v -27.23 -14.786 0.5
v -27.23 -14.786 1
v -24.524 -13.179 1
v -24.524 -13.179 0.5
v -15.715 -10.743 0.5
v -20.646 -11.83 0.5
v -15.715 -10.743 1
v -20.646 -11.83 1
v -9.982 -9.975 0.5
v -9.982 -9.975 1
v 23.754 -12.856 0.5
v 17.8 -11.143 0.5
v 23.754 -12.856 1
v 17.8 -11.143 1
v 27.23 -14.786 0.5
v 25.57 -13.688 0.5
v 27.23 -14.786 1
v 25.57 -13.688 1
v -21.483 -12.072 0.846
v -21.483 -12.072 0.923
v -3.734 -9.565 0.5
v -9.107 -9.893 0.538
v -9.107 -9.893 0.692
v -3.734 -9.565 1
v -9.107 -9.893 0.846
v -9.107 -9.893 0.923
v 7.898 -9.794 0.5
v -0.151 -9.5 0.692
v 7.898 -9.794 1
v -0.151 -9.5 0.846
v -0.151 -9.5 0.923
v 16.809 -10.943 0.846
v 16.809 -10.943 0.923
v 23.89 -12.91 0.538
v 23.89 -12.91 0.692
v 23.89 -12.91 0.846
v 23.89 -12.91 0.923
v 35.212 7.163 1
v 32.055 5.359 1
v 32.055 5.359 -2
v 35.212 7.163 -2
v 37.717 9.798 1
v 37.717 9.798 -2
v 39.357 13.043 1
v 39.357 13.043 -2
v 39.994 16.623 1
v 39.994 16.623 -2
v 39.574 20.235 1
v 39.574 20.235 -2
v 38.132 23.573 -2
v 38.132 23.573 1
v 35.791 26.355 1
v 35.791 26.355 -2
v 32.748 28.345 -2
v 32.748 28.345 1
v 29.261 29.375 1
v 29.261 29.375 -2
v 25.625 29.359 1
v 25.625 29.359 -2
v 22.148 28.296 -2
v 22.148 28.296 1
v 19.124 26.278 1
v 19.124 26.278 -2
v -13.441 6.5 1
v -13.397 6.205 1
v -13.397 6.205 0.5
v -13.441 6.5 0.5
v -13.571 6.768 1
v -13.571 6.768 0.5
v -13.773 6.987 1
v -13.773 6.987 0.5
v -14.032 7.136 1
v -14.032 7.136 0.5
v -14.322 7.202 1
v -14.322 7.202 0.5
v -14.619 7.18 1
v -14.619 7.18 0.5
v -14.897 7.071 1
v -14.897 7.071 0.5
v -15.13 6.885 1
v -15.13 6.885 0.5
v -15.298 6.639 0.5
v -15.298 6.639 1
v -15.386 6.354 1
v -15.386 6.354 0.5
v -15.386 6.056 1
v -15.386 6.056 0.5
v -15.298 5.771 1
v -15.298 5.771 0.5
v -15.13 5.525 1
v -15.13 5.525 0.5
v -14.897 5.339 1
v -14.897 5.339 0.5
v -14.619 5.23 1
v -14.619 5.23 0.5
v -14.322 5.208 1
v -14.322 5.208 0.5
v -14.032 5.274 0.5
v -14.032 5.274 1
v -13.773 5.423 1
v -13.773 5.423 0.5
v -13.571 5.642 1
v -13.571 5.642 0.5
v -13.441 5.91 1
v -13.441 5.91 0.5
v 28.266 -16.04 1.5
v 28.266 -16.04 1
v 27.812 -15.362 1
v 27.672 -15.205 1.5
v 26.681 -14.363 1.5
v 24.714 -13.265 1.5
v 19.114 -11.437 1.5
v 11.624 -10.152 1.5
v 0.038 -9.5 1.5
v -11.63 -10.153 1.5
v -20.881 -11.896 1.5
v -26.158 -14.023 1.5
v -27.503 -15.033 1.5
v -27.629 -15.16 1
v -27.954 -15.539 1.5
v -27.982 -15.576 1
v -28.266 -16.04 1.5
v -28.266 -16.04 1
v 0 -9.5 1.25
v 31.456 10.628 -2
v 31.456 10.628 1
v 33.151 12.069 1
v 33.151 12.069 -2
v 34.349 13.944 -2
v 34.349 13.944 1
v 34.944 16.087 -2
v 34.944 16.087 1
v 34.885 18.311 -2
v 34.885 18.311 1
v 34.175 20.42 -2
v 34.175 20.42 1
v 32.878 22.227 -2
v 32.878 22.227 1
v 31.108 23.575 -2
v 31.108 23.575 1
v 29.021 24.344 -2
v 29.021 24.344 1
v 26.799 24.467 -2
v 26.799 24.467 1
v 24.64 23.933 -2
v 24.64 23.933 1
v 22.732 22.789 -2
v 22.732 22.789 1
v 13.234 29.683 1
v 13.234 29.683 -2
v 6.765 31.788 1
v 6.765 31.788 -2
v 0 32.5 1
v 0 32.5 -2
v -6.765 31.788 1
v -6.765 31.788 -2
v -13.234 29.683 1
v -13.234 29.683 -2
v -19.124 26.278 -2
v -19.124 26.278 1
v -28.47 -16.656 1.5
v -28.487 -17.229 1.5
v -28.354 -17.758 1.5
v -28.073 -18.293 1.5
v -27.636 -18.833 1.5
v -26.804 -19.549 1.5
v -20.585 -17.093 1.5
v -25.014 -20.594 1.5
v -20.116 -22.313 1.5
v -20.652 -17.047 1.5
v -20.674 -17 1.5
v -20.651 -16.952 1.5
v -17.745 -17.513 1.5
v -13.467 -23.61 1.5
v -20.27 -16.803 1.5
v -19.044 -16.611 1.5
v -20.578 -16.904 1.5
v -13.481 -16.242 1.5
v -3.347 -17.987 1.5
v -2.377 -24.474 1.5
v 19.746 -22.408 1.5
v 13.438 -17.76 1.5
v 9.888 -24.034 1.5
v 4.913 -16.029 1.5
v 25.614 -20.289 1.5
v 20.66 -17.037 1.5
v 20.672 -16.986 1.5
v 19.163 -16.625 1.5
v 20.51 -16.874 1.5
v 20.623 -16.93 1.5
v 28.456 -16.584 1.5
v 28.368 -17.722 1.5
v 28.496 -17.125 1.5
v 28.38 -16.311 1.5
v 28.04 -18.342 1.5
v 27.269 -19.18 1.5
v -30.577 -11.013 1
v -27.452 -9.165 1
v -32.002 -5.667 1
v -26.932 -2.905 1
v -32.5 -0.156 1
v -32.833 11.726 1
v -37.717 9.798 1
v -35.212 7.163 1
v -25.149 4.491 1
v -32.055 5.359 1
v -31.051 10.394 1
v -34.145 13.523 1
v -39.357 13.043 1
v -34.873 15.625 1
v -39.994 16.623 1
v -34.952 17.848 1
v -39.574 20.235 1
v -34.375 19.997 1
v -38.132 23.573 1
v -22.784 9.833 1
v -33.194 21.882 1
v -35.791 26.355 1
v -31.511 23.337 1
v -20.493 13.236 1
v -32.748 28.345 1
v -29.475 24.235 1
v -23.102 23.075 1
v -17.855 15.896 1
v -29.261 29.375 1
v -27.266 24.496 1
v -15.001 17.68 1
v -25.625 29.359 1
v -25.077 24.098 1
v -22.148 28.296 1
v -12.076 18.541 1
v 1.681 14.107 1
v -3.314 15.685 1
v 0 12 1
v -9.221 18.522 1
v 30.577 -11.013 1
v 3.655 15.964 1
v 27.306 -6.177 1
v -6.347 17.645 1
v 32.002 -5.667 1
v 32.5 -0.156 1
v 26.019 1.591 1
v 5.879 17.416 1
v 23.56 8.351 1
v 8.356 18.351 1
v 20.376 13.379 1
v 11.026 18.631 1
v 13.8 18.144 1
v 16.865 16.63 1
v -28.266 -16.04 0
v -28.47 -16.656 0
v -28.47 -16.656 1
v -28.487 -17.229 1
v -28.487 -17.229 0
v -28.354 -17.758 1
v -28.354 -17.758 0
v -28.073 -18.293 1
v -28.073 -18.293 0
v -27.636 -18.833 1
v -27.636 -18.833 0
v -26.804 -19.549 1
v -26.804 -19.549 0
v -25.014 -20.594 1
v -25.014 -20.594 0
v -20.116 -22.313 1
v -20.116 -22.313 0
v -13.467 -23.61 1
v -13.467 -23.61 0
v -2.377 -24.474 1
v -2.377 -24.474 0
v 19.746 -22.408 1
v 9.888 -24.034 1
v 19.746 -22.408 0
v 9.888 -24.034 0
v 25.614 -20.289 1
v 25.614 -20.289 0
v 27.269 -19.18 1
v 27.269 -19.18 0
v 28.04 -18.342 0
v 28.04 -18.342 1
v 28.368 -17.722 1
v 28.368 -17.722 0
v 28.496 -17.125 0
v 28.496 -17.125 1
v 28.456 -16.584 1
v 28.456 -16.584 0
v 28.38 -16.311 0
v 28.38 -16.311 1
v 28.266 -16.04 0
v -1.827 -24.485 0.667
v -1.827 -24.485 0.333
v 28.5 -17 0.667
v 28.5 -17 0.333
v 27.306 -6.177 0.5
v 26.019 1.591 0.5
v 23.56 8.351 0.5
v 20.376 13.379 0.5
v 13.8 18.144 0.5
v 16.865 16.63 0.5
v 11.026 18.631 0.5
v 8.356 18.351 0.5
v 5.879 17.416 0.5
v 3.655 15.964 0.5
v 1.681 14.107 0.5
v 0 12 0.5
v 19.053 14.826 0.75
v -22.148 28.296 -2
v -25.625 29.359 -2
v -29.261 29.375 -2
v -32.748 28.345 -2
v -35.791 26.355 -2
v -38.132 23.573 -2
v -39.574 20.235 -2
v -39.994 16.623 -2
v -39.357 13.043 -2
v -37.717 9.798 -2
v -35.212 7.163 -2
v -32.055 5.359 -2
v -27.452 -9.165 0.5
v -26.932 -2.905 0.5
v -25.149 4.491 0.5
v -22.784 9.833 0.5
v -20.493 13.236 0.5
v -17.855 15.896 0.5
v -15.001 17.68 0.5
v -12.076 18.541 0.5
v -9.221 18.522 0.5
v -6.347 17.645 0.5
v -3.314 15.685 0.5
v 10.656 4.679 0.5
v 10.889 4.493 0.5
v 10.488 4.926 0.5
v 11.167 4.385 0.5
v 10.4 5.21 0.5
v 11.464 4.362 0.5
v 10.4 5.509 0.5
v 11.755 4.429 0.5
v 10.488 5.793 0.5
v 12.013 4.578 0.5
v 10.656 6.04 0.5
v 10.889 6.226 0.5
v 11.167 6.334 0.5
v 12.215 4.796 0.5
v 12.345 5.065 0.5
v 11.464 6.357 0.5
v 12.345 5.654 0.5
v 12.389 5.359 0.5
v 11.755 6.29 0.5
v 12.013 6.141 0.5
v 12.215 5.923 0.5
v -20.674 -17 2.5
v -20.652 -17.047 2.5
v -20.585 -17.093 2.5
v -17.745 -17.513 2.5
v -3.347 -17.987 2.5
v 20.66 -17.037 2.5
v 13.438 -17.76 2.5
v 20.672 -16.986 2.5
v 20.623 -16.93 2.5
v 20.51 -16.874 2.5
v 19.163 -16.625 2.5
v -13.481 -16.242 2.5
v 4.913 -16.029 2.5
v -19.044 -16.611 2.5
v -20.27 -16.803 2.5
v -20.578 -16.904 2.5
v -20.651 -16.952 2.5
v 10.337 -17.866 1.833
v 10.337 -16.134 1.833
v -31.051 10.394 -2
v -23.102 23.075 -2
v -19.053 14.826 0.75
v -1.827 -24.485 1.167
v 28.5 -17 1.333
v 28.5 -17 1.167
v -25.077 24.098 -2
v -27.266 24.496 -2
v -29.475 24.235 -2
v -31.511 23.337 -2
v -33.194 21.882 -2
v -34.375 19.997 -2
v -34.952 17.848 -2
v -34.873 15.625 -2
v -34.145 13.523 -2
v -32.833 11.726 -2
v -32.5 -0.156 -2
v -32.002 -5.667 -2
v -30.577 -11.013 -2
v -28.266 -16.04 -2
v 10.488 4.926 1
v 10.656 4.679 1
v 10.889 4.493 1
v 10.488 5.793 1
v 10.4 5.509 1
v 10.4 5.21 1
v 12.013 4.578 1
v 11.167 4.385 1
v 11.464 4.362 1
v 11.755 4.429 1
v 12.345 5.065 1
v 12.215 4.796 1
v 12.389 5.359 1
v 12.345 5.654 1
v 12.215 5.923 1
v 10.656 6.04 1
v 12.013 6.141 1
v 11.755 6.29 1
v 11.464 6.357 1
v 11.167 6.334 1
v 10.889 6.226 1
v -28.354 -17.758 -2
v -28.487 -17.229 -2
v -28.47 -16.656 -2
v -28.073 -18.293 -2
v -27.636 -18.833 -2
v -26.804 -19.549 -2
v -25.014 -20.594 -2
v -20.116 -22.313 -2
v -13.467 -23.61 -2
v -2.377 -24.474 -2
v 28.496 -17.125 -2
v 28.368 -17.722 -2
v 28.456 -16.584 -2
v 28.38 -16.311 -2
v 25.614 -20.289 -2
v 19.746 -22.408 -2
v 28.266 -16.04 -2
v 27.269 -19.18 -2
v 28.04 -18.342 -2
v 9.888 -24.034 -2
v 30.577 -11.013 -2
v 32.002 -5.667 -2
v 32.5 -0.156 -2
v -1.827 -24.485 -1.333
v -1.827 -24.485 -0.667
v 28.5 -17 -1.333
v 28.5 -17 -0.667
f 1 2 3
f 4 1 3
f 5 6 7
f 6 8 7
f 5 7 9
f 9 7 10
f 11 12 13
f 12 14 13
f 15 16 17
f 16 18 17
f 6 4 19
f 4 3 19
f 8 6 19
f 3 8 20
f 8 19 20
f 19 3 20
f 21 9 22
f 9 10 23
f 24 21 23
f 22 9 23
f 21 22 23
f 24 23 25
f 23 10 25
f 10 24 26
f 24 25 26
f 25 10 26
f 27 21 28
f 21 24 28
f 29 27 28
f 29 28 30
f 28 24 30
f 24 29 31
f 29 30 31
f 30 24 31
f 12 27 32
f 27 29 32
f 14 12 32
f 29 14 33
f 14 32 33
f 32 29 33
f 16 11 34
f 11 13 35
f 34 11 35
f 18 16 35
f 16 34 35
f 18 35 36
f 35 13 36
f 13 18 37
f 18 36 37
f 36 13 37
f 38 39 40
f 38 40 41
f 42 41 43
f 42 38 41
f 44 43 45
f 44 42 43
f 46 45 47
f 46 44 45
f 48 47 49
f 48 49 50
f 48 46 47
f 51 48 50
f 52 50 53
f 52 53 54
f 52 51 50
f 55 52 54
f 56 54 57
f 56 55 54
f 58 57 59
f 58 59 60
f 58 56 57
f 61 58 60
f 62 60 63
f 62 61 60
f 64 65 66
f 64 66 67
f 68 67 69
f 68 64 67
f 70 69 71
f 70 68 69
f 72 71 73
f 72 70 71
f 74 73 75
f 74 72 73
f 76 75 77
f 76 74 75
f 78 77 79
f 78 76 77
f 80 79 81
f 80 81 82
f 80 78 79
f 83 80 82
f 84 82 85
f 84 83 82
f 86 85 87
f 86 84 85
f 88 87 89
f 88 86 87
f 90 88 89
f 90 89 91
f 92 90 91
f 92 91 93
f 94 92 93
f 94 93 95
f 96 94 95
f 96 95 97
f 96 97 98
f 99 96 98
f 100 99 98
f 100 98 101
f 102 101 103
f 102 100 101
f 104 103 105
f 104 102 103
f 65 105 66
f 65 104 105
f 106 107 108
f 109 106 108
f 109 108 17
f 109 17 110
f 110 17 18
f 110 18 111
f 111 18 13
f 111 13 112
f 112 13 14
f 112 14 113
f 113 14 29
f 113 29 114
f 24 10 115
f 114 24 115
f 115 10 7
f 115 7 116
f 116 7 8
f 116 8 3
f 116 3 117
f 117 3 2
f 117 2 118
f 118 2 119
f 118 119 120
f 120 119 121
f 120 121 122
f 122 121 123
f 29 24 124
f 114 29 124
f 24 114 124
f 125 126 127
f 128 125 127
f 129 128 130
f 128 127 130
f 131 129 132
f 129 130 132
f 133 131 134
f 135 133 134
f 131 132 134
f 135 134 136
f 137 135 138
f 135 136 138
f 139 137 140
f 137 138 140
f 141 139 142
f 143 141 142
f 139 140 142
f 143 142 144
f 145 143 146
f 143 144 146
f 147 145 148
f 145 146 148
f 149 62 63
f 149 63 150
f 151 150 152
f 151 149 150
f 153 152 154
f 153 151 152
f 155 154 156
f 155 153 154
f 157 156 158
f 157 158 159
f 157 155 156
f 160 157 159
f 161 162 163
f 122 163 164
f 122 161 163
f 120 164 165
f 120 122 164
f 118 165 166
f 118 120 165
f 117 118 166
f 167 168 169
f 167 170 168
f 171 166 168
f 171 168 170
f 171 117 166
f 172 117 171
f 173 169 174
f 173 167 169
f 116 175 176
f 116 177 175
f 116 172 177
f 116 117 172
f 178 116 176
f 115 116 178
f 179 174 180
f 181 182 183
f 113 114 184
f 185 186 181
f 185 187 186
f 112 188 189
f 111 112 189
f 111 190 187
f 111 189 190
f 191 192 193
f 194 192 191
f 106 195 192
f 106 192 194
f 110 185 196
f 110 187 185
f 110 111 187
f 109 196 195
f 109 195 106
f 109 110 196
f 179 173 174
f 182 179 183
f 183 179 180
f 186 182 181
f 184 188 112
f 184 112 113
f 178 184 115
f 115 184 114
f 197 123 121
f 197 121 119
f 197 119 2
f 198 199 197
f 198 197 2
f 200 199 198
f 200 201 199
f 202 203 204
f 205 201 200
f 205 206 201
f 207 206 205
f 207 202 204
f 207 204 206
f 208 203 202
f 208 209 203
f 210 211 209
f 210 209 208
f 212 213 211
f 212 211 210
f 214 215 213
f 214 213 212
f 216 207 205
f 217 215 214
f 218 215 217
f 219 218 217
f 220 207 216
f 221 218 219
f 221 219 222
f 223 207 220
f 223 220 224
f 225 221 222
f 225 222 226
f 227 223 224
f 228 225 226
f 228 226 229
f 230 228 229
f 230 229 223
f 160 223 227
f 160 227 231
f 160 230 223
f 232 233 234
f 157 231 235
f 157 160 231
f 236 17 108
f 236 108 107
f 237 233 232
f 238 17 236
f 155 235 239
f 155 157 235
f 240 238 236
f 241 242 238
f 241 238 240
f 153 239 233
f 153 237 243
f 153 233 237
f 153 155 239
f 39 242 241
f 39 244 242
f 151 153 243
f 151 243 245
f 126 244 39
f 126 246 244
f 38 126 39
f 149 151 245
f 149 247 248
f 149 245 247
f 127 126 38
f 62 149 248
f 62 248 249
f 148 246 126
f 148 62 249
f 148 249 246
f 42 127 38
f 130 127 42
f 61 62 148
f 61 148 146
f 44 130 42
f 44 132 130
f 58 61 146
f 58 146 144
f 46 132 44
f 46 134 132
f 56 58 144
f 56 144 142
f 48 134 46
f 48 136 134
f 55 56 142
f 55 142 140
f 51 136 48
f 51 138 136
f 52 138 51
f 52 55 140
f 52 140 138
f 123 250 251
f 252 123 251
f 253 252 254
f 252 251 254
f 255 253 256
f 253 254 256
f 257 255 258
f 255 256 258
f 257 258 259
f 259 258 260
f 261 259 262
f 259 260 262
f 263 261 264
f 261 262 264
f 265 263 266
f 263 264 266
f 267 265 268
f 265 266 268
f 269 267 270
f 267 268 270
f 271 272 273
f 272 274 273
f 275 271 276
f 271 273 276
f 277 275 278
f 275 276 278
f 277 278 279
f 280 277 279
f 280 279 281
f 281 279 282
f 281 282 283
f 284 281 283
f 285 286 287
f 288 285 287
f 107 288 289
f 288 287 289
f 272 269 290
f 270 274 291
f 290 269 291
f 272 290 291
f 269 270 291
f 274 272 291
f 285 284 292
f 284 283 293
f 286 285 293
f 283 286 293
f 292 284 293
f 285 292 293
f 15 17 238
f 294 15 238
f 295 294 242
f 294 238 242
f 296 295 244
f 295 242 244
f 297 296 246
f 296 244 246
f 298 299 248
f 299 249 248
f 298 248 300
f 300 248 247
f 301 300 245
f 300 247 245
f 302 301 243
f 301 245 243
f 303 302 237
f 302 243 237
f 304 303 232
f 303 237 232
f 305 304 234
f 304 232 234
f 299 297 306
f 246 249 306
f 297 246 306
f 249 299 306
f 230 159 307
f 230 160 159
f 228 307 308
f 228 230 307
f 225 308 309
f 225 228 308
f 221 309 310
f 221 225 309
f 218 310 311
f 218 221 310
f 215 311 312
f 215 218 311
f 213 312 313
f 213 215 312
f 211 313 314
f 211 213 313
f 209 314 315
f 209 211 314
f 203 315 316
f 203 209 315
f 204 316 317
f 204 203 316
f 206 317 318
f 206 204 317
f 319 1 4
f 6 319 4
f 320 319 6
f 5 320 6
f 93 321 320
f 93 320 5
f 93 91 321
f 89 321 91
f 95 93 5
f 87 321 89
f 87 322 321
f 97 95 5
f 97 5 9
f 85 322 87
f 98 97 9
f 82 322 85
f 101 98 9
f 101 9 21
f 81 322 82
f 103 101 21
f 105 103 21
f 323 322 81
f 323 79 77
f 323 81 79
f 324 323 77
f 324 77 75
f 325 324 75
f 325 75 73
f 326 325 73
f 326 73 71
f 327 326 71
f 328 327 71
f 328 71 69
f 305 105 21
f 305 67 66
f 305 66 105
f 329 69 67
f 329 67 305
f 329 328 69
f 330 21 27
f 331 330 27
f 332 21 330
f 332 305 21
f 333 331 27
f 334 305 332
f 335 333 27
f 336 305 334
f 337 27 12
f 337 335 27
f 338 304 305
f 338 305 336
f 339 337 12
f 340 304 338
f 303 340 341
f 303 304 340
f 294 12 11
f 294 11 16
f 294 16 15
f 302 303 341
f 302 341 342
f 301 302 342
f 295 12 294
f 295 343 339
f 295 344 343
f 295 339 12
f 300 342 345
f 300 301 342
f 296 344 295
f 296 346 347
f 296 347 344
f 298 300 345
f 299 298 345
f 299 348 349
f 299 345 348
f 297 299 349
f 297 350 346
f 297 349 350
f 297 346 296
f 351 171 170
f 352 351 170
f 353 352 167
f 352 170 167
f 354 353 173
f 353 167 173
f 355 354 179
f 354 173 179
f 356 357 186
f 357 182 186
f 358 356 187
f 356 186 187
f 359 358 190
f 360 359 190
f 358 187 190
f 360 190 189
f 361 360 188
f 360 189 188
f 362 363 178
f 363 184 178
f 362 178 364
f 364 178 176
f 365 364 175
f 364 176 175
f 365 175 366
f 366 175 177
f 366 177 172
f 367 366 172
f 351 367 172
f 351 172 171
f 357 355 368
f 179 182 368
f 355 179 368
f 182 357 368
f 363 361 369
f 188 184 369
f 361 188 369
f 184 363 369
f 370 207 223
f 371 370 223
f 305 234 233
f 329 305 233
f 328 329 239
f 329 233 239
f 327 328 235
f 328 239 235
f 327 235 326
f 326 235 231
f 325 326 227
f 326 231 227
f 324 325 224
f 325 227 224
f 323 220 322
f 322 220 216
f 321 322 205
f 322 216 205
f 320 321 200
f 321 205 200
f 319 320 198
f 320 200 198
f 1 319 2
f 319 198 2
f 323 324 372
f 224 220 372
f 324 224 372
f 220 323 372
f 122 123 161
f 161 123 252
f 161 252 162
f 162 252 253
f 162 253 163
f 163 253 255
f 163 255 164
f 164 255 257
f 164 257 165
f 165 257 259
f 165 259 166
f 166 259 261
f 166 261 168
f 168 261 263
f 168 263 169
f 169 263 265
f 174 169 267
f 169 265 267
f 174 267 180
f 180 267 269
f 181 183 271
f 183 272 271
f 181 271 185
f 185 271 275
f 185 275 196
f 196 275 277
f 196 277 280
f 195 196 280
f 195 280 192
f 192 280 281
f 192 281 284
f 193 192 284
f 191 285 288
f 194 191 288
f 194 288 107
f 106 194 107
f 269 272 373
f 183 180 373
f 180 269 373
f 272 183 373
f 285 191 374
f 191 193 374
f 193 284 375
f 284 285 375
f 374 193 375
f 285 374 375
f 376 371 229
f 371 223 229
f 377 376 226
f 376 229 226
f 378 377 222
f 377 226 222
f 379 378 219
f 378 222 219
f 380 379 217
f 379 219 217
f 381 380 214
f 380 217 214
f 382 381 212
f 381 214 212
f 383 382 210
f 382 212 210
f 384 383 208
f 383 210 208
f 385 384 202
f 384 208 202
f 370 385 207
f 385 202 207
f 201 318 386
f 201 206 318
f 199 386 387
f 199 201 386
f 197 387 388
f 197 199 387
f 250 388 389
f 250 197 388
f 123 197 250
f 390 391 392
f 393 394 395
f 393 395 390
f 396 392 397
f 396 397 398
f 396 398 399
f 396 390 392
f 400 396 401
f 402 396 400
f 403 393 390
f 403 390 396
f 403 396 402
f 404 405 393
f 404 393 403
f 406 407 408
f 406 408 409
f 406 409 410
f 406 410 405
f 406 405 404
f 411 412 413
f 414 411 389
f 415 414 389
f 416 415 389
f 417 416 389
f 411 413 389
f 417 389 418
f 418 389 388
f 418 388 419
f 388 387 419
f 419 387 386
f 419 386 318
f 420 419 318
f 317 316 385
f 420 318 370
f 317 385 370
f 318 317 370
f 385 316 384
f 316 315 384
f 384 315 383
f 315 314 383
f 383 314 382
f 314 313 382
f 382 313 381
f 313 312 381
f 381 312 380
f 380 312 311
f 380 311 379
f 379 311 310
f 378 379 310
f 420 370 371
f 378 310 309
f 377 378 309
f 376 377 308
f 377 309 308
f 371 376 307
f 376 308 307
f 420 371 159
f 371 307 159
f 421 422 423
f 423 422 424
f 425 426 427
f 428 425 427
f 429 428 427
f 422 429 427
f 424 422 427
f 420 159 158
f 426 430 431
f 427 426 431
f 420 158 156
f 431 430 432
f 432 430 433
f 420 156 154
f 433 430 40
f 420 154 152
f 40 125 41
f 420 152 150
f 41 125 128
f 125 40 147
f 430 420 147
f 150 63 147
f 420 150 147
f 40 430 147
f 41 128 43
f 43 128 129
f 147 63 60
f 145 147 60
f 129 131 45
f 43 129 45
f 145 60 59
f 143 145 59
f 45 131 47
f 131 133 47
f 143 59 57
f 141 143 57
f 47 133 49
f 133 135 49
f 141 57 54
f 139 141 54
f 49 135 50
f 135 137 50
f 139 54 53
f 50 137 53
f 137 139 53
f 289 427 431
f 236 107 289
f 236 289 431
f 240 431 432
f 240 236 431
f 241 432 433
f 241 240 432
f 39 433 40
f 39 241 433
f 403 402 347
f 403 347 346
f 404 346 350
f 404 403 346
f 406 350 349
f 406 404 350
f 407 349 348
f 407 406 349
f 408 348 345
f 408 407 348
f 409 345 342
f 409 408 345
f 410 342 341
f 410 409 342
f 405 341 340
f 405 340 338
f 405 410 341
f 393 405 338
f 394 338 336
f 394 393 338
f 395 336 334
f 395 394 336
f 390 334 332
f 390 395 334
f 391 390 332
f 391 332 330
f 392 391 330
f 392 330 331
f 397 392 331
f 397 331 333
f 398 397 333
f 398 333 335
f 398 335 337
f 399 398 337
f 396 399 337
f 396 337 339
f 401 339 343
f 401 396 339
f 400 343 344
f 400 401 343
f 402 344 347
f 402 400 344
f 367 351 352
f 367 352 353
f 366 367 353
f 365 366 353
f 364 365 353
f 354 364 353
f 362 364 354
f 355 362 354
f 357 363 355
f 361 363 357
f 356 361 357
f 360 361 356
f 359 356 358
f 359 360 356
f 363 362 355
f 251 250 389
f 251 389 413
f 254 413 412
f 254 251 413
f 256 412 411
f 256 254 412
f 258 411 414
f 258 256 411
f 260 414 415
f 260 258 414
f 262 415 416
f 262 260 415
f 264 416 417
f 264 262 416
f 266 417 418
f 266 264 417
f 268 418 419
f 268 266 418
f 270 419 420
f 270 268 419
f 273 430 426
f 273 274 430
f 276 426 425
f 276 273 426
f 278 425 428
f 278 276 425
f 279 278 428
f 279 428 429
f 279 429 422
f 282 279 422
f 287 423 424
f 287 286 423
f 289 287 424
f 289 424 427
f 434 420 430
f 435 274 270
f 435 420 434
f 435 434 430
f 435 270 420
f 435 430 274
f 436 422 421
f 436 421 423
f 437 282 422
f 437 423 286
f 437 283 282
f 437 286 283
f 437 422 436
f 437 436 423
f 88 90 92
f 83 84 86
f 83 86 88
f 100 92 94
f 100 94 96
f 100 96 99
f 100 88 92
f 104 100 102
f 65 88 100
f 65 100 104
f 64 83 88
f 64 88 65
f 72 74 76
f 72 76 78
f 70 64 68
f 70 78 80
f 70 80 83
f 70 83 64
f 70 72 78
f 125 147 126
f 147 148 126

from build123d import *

# Parameters (mm, degrees)
F1_DEPTH = 1
F2_DEPTH = 1.5
F3_R     = 1
F4_DEPTH = 0.5
F6_DEPTH = 25
F8_DEPTH = 1
F9_DEPTH = 2


with BuildPart() as f1:
    # F0 (on Top) → F1 (new body)
    with BuildSketch(Plane.XY):
        with BuildLine():
            ThreePointArc((-19.1235008121, 26.278160451), (-38.1324321193, 23.5727762192), (-32.0550449903, 5.359486045))
            ThreePointArc((-32.0550449903, 5.359486045), (-32.0021823164, -5.6665974787), (-28.2657794627, -16.0404398744))
            add(Edge.make_bspline(
                [(28.2657794627, -16.0404398744), (25.0596180916, -9.5), (0, -9.5), (-25.0596180916, -9.5), (-28.2657794627, -16.0404398744)],
                knots=[0.1282929916, 0.1282929916, 0.1282929916, 1.5707963268, 1.5707963268, 3.013299662, 3.013299662, 3.013299662], degree=2, weights=[1, 0.75097981, 1, 0.75097981, 1]))
            ThreePointArc((28.2657794627, -16.0404398744), (32.0021823164, -5.6665974787), (32.0550449903, 5.359486045))
            ThreePointArc((32.0550449903, 5.359486045), (38.1324321193, 23.5727762192), (19.1235008121, 26.278160451))
            ThreePointArc((19.1235008121, 26.278160451), (0, 32.5), (-19.1235008121, 26.278160451))
        make_face()
        with BuildLine():
            add(Edge.make_bspline(
                [(28.2657794627, -16.0404398744), (25.0596180916, -9.5), (0, -9.5), (-25.0596180916, -9.5), (-28.2657794627, -16.0404398744)],
                knots=[0.1282929916, 0.1282929916, 0.1282929916, 1.5707963268, 1.5707963268, 3.013299662, 3.013299662, 3.013299662], degree=2, weights=[1, 0.75097981, 1, 0.75097981, 1]))
            add(Edge.make_bspline(
                [(-28.2657794627, -16.0404398744), (-32.1538432676, -23.9719332087), (-1.8269216338, -24.4845748919), (28.5, -24.9972165751), (28.5, -17)],
                knots=[3.013299662, 3.013299662, 3.013299662, 4.6482424846, 4.6482424846, 6.2831853072, 6.2831853072, 6.2831853072], degree=2, weights=[1, 0.6840677914, 1, 0.6840677914, 1]))
            add(Edge.make_bspline(
                [(28.5, -17), (28.5, -16.518240323), (28.2657794627, -16.0404398744)],
                knots=[0, 0, 0, 0.1282929916, 0.1282929916, 0.1282929916], degree=2, weights=[1, 0.9979433189, 1]))
        make_face()
    extrude(amount=F1_DEPTH)

    # F0 (on Top) → F2 (join)
    with BuildSketch(Plane.XY):
        with BuildLine():
            add(Edge.make_bspline(
                [(28.2657794627, -16.0404398744), (25.0596180916, -9.5), (0, -9.5), (-25.0596180916, -9.5), (-28.2657794627, -16.0404398744)],
                knots=[0.1282929916, 0.1282929916, 0.1282929916, 1.5707963268, 1.5707963268, 3.013299662, 3.013299662, 3.013299662], degree=2, weights=[1, 0.75097981, 1, 0.75097981, 1]))
            add(Edge.make_bspline(
                [(-28.2657794627, -16.0404398744), (-32.1538432676, -23.9719332087), (-1.8269216338, -24.4845748919), (28.5, -24.9972165751), (28.5, -17)],
                knots=[3.013299662, 3.013299662, 3.013299662, 4.6482424846, 4.6482424846, 6.2831853072, 6.2831853072, 6.2831853072], degree=2, weights=[1, 0.6840677914, 1, 0.6840677914, 1]))
            add(Edge.make_bspline(
                [(28.5, -17), (28.5, -16.518240323), (28.2657794627, -16.0404398744)],
                knots=[0, 0, 0, 0.1282929916, 0.1282929916, 0.1282929916], degree=2, weights=[1, 0.9979433189, 1]))
        make_face()
    extrude(amount=F2_DEPTH)

    # F3 (on face) → F4 (cut)
    with BuildSketch(Plane.XY.offset(1)):
        with BuildLine():
            add(Edge.make_bspline(
                [(27.2298485398, -14.785946603), (34.6781532449, 61.4301931961), (0, 12)],
                knots=[4.5465331149, 4.5465331149, 4.5465331149, 6.9772320681, 6.9772320681, 6.9772320681], degree=2, weights=[1, 0.348009318, 1]))
            add(Edge.make_bspline(
                [(0, 12), (-34.6781532449, 61.4301931961), (-27.2298485398, -14.785946603)],
                knots=[5.5891385462, 5.5891385462, 5.5891385462, 8.0198374994, 8.0198374994, 8.0198374994], degree=2, weights=[1, 0.348009318, 1]))
            add(Edge.make_bspline(
                [(-27.2298485438, -14.7859465983), (-27.1235005909, -14.6953694452), (-27.0148324256, -14.6074553179), (-26.9041242662, -14.5220377708), (-26.7916116729, -14.4389689728), (-26.6774911689, -14.3581129382), (-26.5619238942, -14.2793410628), (-26.4450372953, -14.2025299637), (-26.1154259475, -13.9933190312), (-25.9001007444, -13.8650502344), (-25.6815764788, -13.7421154762), (-25.4603422242, -13.6240265652), (-25.2367872003, -13.5103782123), (-25.0112167389, -13.4008190797), (-24.7838582265, -13.2950409799), (-24.1815269893, -13.0260138383), (-23.8039763572, -12.8686274032), (-23.4229953928, -12.7194286319), (-23.0391676676, -12.5775726359), (-22.6529452943, -12.442384814), (-22.2646725462, -12.3132991432), (-21.8745928745, -12.1898396478), (-21.0075231865, -11.9280985148), (-20.5298402909, -11.7923034154), (-20.0501673244, -11.6634792789), (-19.5687883822, -11.5410606749), (-19.0859317536, -11.4245881786), (-18.6017794799, -11.3136725414), (-18.1164723782, -11.2079754108), (-16.5759163532, -10.8887891981), (-15.5169354155, -10.6935580552), (-14.4542494004, -10.5185387591), (-13.3886584475, -10.3618210579), (-12.3207818781, -10.2219317761), (-11.2510694701, -10.0977602294), (-10.1798249497, -9.9884221743), (-7.9905872411, -9.7941373106), (-6.872614176, -9.7103865584), (-5.7535809166, -9.6412114374), (-4.6337472088, -9.586067236), (-3.5133459581, -9.5445749391), (-2.3925855443, -9.5164852067), (-1.2716508776, -9.5016647144), (-0.0658567051, -9.4999867866), (0.0188272492, -9.4999449156), (0.103506139, -9.4999785093), (0.1882859732, -9.5000876991), (0.273221364, -9.500273079), (0.358315594, -9.5005353037), (0.4435206851, -9.5008746872), (1.9146357736, -9.5080581365), (3.300394752, -9.5351034815), (4.6857535149, -9.5824945952), (6.0703729366, -9.6505743409), (7.4538305978, -9.7399869052), (8.8356188507, -9.8516936697), (10.215135598, -9.987094422), (12.2470780769, -10.2251595717), (12.9017942823, -10.3078129902), (13.5557282033, -10.3965638624), (14.2087777108, -10.491687712), (14.8608158428, -10.5935051159), (15.5116886245, -10.7023952032), (16.1612112004, -10.8188191074), (17.3779682579, -11.0526761832), (17.9455245563, -11.1682417081), (18.5117085891, -11.2904454713), (19.0763384267, -11.419745162), (19.6391657791, -11.5566868167), (20.1998710662, -11.7019244141), (20.7580501445, -11.8562724484), (21.6401455013, -12.1177532327), (21.9660283027, -12.2182108793), (22.2907322232, -12.322429107), (22.6141230493, -12.430665212), (22.9360300506, -12.5432111617), (23.2562413481, -12.6604065516), (23.5744953864, -12.7826620273), (24.1535181548, -13.0169134178), (24.4149432173, -13.1271804164), (24.6745873797, -13.2416031142), (24.9322211673, -13.3605257562), (25.187532615, -13.4843455592), (25.4401209542, -13.613525357), (25.6894788059, -13.748629127), (26.1059183514, -13.9891577643), (26.2747150273, -14.0909802774), (26.4413094594, -14.1962143234), (26.6055249122, -14.3052048432), (26.7670432139, -14.418298237), (26.9253904774, -14.5358566012), (27.0799325858, -14.6582621601), (27.2298485569, -14.7859465829)],
                knots=[0.0277398129, 0.0277398129, 0.0277398129, 0.0277398129, 0.0277398129, 0.0277398129, 0.0277398129, 0.0277398129, 0.0277398129, 0.046627634, 0.046627634, 0.046627634, 0.046627634, 0.046627634, 0.046627634, 0.046627634, 0.080449246, 0.080449246, 0.080449246, 0.080449246, 0.080449246, 0.080449246, 0.080449246, 0.1355918365, 0.1355918365, 0.1355918365, 0.1355918365, 0.1355918365, 0.1355918365, 0.1355918365, 0.202503631, 0.202503631, 0.202503631, 0.202503631, 0.202503631, 0.202503631, 0.202503631, 0.3475356161, 0.3475356161, 0.3475356161, 0.3475356161, 0.3475356161, 0.3475356161, 0.3475356161, 0.4985180369, 0.4985180369, 0.4985180369, 0.4985180369, 0.4985180369, 0.4985180369, 0.4985180369, 0.5099461608, 0.5099461608, 0.5099461608, 0.5099461608, 0.5099461608, 0.5099461608, 0.5099461608, 0.695804126, 0.695804126, 0.695804126, 0.695804126, 0.695804126, 0.695804126, 0.695804126, 0.7842990266, 0.7842990266, 0.7842990266, 0.7842990266, 0.7842990266, 0.7842990266, 0.7842990266, 0.8619845652, 0.8619845652, 0.8619845652, 0.8619845652, 0.8619845652, 0.8619845652, 0.8619845652, 0.9077400087, 0.9077400087, 0.9077400087, 0.9077400087, 0.9077400087, 0.9077400087, 0.9077400087, 0.9458317068, 0.9458317068, 0.9458317068, 0.9458317068, 0.9458317068, 0.9458317068, 0.9458317068, 0.972362644, 0.972362644, 0.972362644, 0.972362644, 0.972362644, 0.972362644, 0.972362644, 0.972362644, 0.972362644], degree=8))
        make_face()
        with Locations((-14.3968807533, 6.2048500404)):
            Circle(F3_R, mode=Mode.SUBTRACT)
        with Locations((11.3892154768, 5.359486045)):
            Circle(F3_R, mode=Mode.SUBTRACT)
    extrude(amount=-F4_DEPTH, mode=Mode.SUBTRACT)

    # F5 (on face) → F6 (cut)
    with BuildSketch(Plane.XY.offset(1)):
        with BuildLine():
            Line((-31.0509426966, 10.3938811723), (-23.101764943, 23.074992048))
            ThreePointArc((-23.101764943, 23.074992048), (-33.8546927027, 20.9834508474), (-31.0509426966, 10.3938811723))
        make_face()
        with BuildLine():
            ThreePointArc((31.4558537042, 10.6280912224), (33.5940096319, 21.3718470474), (22.7316116782, 22.788995838))
            Line((22.7316116782, 22.788995838), (31.4558537042, 10.6280912224))
        make_face()
    extrude(amount=-F6_DEPTH, mode=Mode.SUBTRACT)

    # F7 (on face) → F8 (join)
    with BuildSketch(Plane.XY.offset(1.5)):
        with BuildLine():
            add(Edge.make_bspline(
                [(-20.6742249429, -17), (-20.6742249429, -18.7320508076), (10.3371124715, -17.8660254038), (41.3484498858, -17), (10.3371124715, -16.1339745962), (-20.6742249429, -15.2679491924), (-20.6742249429, -17)],
                knots=[0, 0, 0, 2.0943951024, 2.0943951024, 4.1887902048, 4.1887902048, 6.2831853072, 6.2831853072, 6.2831853072], degree=2, weights=[1, 0.5, 1, 0.5, 1, 0.5, 1]))
        make_face()
    extrude(amount=F8_DEPTH)

    # F9 (add): a face of the model
    f9_faces = [f1.faces().sort_by_distance(p)[0] for p in [
        (0.0027966544, 4.1583376267, 0),
    ]]
    extrude(f9_faces, amount=F9_DEPTH)


solid = f1.part
